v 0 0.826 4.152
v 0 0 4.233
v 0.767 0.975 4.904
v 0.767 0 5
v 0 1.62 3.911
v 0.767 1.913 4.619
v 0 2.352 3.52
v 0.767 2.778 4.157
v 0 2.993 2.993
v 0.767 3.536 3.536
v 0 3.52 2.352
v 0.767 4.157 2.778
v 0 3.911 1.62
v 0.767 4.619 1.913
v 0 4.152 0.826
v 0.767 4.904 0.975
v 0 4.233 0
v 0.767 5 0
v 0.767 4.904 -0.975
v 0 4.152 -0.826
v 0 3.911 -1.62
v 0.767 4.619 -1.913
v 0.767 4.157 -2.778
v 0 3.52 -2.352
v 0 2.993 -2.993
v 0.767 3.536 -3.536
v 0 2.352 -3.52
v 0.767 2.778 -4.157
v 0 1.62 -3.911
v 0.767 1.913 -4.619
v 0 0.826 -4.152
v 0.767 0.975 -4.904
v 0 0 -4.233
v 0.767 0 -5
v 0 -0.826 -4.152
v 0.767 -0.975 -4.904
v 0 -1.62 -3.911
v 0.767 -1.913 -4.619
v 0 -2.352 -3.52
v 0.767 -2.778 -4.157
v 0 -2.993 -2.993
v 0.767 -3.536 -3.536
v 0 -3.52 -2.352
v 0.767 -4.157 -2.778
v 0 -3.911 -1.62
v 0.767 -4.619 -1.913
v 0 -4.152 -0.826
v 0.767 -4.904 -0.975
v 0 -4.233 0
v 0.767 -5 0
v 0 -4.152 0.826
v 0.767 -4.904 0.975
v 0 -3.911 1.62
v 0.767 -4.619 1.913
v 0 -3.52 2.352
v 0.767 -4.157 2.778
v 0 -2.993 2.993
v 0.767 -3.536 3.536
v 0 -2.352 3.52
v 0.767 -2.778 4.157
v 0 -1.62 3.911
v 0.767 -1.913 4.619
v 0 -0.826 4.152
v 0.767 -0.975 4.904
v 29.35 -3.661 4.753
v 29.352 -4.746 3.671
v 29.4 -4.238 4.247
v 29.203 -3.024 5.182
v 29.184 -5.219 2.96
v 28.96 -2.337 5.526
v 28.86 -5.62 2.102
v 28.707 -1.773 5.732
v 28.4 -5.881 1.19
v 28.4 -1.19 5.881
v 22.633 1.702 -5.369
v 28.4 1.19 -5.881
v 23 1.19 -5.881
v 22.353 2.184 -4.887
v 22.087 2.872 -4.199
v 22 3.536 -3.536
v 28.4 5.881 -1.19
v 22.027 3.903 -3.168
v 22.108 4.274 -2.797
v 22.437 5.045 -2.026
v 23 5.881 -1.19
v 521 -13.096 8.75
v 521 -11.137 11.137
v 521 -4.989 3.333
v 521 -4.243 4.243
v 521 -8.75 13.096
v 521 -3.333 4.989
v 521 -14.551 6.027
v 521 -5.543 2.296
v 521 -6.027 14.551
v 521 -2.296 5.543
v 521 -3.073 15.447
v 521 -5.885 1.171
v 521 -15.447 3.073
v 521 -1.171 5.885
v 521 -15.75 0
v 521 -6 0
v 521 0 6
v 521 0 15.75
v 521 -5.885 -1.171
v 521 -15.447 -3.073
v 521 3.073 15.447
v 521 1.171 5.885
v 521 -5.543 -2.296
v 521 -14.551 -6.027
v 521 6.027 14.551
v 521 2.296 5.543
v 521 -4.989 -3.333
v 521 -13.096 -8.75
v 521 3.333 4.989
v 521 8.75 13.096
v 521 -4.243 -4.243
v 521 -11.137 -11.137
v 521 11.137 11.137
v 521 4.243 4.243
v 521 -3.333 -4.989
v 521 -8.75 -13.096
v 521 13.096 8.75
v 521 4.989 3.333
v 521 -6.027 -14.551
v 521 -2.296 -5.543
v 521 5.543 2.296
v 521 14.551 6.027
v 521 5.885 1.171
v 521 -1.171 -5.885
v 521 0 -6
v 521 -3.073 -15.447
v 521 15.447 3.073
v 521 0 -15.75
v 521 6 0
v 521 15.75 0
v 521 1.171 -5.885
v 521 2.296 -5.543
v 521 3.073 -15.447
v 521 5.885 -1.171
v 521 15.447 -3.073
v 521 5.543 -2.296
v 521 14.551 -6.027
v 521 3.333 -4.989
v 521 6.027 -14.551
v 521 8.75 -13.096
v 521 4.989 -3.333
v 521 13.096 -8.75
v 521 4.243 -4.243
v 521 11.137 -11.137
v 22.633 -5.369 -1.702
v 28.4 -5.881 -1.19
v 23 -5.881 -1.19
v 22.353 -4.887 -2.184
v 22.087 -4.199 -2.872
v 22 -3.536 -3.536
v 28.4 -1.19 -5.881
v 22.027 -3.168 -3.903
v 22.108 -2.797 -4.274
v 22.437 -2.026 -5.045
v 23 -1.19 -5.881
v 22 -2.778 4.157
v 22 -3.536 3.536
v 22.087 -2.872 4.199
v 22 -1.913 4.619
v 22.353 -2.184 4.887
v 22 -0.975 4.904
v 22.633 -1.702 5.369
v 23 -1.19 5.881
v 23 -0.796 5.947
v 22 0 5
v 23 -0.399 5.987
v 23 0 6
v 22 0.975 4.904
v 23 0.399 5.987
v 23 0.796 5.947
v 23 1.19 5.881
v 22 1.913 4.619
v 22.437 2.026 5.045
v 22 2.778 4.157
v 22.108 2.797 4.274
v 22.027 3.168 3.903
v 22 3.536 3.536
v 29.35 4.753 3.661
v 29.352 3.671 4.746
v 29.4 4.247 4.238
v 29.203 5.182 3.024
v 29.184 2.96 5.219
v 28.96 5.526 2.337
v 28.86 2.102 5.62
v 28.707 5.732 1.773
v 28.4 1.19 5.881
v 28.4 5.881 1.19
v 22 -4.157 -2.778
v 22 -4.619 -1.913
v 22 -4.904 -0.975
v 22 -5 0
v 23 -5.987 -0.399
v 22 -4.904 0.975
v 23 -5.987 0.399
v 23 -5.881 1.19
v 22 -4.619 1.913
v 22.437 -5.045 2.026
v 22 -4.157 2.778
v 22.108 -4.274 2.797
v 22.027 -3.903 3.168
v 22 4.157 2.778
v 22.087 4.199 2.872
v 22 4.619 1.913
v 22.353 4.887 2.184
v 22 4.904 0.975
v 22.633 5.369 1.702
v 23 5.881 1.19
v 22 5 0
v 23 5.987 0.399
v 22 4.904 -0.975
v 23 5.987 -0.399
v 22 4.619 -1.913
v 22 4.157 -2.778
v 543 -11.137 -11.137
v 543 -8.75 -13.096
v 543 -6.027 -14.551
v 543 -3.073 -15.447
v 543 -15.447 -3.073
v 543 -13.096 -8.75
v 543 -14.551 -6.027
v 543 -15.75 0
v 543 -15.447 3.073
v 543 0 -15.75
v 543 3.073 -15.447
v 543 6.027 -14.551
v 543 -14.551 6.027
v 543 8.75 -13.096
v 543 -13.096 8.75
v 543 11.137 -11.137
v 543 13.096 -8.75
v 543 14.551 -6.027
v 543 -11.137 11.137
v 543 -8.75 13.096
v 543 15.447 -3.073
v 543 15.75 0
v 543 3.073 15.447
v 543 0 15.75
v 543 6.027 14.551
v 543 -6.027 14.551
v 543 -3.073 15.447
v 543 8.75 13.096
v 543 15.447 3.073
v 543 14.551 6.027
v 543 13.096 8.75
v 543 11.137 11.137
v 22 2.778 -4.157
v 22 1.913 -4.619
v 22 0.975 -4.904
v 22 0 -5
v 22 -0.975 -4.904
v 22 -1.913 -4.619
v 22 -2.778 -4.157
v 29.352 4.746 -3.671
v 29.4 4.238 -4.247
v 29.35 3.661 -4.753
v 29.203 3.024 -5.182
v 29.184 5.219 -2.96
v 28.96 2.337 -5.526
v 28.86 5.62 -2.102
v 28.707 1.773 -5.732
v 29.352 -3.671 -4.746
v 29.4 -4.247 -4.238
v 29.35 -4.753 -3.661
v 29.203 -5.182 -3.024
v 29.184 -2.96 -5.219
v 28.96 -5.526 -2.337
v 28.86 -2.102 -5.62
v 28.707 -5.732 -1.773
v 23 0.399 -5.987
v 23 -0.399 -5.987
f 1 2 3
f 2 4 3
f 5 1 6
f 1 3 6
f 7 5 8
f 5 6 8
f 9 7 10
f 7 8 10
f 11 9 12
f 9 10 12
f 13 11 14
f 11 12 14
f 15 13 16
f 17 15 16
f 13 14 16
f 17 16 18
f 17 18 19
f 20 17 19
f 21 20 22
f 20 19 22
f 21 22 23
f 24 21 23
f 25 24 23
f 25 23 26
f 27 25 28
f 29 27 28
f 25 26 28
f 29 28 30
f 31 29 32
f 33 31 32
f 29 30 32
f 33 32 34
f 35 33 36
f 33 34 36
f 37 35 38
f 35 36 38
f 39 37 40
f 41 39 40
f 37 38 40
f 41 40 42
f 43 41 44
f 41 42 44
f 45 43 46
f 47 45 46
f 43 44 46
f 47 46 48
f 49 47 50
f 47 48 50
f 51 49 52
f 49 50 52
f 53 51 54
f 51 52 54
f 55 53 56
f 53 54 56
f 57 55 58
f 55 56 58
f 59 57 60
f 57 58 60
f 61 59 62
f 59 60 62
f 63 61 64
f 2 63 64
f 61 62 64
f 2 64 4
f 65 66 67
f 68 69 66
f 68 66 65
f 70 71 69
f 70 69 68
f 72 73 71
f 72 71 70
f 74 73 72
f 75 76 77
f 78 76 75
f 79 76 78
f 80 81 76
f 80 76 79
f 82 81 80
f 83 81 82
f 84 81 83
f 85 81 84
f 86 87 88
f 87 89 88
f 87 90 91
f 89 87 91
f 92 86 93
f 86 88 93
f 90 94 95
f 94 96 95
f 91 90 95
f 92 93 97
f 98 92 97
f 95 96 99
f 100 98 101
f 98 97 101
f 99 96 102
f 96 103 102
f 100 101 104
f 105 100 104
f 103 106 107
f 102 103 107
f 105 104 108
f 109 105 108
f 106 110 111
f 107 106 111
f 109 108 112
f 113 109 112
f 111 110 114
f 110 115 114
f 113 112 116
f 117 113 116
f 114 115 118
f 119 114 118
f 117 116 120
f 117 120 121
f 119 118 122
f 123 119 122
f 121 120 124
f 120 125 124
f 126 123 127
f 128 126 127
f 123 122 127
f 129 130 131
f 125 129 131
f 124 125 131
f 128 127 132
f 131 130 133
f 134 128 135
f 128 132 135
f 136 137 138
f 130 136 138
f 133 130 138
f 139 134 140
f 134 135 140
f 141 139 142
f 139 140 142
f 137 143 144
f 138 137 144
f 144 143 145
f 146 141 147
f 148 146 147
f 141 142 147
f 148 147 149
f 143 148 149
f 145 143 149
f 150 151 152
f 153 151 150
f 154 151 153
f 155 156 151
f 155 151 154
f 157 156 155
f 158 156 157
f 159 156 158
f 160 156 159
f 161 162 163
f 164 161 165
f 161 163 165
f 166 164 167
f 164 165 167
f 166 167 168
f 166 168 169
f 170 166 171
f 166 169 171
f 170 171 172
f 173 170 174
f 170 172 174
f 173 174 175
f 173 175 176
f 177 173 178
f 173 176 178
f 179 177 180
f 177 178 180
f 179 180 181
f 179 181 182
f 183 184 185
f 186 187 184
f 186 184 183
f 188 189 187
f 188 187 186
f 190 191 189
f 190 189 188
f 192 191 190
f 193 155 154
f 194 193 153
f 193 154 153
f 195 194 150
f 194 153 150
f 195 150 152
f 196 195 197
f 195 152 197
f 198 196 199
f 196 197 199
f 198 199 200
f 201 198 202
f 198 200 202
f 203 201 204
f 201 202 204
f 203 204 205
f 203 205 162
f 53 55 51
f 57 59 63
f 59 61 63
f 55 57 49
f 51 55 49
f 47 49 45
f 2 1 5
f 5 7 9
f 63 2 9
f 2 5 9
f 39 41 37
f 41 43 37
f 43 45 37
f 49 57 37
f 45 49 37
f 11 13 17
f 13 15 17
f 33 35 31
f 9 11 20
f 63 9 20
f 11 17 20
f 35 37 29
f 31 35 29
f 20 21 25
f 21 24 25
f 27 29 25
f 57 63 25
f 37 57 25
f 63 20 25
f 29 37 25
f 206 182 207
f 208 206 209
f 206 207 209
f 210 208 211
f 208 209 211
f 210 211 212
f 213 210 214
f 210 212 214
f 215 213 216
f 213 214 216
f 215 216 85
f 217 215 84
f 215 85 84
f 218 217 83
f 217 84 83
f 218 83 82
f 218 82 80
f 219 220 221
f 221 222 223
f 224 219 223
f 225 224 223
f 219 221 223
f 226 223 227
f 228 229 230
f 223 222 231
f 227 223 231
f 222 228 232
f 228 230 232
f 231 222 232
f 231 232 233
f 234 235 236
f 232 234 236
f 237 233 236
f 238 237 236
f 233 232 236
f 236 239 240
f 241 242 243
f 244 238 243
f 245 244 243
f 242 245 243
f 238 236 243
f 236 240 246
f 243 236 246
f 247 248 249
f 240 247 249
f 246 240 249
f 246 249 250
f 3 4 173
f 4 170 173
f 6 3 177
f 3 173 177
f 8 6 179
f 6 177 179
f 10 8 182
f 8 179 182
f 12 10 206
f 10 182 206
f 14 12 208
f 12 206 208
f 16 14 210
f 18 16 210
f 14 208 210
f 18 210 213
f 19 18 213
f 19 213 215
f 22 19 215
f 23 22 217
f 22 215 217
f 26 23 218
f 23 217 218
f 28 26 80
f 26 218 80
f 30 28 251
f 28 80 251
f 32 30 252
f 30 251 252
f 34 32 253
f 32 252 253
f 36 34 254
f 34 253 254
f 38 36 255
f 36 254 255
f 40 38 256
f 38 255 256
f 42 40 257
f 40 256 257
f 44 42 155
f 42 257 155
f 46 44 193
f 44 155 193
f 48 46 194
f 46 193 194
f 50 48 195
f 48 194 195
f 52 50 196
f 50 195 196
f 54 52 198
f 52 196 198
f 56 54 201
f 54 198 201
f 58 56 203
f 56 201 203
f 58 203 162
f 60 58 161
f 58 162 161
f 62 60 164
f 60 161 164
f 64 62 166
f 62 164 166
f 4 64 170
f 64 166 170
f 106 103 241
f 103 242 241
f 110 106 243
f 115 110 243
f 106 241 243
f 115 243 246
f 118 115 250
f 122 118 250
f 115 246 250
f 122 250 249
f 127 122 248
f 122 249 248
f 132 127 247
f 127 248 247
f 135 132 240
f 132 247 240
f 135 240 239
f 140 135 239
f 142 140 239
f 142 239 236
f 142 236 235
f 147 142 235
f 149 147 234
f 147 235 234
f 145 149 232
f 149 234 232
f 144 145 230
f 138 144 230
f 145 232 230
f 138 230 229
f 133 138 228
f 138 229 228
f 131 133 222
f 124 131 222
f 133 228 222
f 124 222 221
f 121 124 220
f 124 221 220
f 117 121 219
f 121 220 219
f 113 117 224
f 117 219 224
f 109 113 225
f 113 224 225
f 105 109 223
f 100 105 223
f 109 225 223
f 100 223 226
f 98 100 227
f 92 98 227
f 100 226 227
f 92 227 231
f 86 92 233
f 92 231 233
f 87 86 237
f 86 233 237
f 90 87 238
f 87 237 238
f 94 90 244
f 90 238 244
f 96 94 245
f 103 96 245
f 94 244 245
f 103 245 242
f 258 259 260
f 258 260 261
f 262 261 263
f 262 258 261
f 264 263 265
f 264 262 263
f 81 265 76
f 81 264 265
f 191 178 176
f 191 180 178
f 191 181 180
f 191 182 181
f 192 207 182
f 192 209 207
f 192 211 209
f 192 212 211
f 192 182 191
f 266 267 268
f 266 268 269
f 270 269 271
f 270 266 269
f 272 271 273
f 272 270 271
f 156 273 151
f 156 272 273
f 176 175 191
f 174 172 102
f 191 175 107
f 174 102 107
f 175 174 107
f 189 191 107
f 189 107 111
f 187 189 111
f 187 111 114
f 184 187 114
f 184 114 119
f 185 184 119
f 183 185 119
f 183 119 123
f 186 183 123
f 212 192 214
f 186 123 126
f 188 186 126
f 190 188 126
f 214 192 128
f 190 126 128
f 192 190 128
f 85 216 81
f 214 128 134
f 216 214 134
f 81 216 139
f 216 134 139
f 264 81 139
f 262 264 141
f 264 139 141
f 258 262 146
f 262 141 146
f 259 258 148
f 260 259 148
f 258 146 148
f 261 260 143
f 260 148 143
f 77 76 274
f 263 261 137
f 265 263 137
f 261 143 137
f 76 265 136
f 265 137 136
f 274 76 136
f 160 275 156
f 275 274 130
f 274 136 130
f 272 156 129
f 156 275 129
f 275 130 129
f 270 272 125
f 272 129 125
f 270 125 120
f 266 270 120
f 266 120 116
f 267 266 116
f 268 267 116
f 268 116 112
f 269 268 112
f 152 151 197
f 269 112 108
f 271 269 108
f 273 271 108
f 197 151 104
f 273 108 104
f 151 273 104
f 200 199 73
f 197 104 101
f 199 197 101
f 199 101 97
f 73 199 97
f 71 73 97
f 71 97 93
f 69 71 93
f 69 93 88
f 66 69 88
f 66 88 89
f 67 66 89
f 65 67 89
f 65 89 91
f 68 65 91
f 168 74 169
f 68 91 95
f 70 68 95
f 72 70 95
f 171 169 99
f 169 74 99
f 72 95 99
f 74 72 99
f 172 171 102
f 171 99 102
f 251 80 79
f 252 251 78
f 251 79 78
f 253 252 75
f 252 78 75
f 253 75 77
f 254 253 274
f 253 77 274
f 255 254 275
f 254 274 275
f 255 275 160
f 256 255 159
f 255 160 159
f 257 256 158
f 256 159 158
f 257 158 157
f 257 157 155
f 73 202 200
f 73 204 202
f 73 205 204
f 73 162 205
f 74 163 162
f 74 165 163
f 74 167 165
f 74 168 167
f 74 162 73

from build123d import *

# Parameters (mm, degrees)
CUT_EXTRUDE_1_DEPTH      = 5
CUT_EXTRUDE_1_DEPTH_BACK = 5
CUT_EXTRUDE_2_DEPTH      = 5
CUT_EXTRUDE_2_DEPTH_BACK = 5


with BuildPart() as part:
    # 草图1 → 旋转1 (revolve)
    with BuildSketch(Plane.XY):
        Polygon((0, 0), (0, 4.233), (0.767, 5), (22, 5), (23, 6), (521, 6), (521, 15.75), (543, 15.75), (543, 0), align=None)
    revolve(axis=Axis((543, 0, 0), (-1, 0, 0)))

    # 草图2 → 切除-拉伸1 (cut, two sides: drawn at the far end of the back side and taken through both)
    with BuildSketch(Plane(origin=(0, 0, 0), x_dir=(1, 0, 0), z_dir=(0, -0.7071067811865477, 0.7071067811865475)).offset(-CUT_EXTRUDE_1_DEPTH_BACK)):
        Polygon((-5, -12), (35.4, -12), (28.4, -5), (22, -5), (19.8, -7.2), (19.8, -10), (-3, -10), (-3, 10), (19.8, 10), (19.8, 7.2), (22, 5), (28.4, 5), (35.4, 12), (-5, 12), align=None)
    extrude(amount=CUT_EXTRUDE_1_DEPTH + CUT_EXTRUDE_1_DEPTH_BACK, mode=Mode.SUBTRACT)

    # 草图3 → 切除-拉伸2 (cut, two sides: drawn at the far end of the back side and taken through both)
    with BuildSketch(Plane(origin=(0, 0, 0), x_dir=(-1, 0, 0), z_dir=(0, -0.7071067811865477, -0.7071067811865475)).offset(-CUT_EXTRUDE_2_DEPTH_BACK)):
        Polygon((5, 12), (-35.4, 12), (-28.4, 5), (-22, 5), (-19.8, 7.2), (-19.8, 10), (3, 10), (3, -10), (-19.8, -10), (-19.8, -7.2), (-22, -5), (-28.4, -5), (-35.4, -12), (5, -12), align=None)
    extrude(amount=CUT_EXTRUDE_2_DEPTH + CUT_EXTRUDE_2_DEPTH_BACK, mode=Mode.SUBTRACT)


solid = part.part
